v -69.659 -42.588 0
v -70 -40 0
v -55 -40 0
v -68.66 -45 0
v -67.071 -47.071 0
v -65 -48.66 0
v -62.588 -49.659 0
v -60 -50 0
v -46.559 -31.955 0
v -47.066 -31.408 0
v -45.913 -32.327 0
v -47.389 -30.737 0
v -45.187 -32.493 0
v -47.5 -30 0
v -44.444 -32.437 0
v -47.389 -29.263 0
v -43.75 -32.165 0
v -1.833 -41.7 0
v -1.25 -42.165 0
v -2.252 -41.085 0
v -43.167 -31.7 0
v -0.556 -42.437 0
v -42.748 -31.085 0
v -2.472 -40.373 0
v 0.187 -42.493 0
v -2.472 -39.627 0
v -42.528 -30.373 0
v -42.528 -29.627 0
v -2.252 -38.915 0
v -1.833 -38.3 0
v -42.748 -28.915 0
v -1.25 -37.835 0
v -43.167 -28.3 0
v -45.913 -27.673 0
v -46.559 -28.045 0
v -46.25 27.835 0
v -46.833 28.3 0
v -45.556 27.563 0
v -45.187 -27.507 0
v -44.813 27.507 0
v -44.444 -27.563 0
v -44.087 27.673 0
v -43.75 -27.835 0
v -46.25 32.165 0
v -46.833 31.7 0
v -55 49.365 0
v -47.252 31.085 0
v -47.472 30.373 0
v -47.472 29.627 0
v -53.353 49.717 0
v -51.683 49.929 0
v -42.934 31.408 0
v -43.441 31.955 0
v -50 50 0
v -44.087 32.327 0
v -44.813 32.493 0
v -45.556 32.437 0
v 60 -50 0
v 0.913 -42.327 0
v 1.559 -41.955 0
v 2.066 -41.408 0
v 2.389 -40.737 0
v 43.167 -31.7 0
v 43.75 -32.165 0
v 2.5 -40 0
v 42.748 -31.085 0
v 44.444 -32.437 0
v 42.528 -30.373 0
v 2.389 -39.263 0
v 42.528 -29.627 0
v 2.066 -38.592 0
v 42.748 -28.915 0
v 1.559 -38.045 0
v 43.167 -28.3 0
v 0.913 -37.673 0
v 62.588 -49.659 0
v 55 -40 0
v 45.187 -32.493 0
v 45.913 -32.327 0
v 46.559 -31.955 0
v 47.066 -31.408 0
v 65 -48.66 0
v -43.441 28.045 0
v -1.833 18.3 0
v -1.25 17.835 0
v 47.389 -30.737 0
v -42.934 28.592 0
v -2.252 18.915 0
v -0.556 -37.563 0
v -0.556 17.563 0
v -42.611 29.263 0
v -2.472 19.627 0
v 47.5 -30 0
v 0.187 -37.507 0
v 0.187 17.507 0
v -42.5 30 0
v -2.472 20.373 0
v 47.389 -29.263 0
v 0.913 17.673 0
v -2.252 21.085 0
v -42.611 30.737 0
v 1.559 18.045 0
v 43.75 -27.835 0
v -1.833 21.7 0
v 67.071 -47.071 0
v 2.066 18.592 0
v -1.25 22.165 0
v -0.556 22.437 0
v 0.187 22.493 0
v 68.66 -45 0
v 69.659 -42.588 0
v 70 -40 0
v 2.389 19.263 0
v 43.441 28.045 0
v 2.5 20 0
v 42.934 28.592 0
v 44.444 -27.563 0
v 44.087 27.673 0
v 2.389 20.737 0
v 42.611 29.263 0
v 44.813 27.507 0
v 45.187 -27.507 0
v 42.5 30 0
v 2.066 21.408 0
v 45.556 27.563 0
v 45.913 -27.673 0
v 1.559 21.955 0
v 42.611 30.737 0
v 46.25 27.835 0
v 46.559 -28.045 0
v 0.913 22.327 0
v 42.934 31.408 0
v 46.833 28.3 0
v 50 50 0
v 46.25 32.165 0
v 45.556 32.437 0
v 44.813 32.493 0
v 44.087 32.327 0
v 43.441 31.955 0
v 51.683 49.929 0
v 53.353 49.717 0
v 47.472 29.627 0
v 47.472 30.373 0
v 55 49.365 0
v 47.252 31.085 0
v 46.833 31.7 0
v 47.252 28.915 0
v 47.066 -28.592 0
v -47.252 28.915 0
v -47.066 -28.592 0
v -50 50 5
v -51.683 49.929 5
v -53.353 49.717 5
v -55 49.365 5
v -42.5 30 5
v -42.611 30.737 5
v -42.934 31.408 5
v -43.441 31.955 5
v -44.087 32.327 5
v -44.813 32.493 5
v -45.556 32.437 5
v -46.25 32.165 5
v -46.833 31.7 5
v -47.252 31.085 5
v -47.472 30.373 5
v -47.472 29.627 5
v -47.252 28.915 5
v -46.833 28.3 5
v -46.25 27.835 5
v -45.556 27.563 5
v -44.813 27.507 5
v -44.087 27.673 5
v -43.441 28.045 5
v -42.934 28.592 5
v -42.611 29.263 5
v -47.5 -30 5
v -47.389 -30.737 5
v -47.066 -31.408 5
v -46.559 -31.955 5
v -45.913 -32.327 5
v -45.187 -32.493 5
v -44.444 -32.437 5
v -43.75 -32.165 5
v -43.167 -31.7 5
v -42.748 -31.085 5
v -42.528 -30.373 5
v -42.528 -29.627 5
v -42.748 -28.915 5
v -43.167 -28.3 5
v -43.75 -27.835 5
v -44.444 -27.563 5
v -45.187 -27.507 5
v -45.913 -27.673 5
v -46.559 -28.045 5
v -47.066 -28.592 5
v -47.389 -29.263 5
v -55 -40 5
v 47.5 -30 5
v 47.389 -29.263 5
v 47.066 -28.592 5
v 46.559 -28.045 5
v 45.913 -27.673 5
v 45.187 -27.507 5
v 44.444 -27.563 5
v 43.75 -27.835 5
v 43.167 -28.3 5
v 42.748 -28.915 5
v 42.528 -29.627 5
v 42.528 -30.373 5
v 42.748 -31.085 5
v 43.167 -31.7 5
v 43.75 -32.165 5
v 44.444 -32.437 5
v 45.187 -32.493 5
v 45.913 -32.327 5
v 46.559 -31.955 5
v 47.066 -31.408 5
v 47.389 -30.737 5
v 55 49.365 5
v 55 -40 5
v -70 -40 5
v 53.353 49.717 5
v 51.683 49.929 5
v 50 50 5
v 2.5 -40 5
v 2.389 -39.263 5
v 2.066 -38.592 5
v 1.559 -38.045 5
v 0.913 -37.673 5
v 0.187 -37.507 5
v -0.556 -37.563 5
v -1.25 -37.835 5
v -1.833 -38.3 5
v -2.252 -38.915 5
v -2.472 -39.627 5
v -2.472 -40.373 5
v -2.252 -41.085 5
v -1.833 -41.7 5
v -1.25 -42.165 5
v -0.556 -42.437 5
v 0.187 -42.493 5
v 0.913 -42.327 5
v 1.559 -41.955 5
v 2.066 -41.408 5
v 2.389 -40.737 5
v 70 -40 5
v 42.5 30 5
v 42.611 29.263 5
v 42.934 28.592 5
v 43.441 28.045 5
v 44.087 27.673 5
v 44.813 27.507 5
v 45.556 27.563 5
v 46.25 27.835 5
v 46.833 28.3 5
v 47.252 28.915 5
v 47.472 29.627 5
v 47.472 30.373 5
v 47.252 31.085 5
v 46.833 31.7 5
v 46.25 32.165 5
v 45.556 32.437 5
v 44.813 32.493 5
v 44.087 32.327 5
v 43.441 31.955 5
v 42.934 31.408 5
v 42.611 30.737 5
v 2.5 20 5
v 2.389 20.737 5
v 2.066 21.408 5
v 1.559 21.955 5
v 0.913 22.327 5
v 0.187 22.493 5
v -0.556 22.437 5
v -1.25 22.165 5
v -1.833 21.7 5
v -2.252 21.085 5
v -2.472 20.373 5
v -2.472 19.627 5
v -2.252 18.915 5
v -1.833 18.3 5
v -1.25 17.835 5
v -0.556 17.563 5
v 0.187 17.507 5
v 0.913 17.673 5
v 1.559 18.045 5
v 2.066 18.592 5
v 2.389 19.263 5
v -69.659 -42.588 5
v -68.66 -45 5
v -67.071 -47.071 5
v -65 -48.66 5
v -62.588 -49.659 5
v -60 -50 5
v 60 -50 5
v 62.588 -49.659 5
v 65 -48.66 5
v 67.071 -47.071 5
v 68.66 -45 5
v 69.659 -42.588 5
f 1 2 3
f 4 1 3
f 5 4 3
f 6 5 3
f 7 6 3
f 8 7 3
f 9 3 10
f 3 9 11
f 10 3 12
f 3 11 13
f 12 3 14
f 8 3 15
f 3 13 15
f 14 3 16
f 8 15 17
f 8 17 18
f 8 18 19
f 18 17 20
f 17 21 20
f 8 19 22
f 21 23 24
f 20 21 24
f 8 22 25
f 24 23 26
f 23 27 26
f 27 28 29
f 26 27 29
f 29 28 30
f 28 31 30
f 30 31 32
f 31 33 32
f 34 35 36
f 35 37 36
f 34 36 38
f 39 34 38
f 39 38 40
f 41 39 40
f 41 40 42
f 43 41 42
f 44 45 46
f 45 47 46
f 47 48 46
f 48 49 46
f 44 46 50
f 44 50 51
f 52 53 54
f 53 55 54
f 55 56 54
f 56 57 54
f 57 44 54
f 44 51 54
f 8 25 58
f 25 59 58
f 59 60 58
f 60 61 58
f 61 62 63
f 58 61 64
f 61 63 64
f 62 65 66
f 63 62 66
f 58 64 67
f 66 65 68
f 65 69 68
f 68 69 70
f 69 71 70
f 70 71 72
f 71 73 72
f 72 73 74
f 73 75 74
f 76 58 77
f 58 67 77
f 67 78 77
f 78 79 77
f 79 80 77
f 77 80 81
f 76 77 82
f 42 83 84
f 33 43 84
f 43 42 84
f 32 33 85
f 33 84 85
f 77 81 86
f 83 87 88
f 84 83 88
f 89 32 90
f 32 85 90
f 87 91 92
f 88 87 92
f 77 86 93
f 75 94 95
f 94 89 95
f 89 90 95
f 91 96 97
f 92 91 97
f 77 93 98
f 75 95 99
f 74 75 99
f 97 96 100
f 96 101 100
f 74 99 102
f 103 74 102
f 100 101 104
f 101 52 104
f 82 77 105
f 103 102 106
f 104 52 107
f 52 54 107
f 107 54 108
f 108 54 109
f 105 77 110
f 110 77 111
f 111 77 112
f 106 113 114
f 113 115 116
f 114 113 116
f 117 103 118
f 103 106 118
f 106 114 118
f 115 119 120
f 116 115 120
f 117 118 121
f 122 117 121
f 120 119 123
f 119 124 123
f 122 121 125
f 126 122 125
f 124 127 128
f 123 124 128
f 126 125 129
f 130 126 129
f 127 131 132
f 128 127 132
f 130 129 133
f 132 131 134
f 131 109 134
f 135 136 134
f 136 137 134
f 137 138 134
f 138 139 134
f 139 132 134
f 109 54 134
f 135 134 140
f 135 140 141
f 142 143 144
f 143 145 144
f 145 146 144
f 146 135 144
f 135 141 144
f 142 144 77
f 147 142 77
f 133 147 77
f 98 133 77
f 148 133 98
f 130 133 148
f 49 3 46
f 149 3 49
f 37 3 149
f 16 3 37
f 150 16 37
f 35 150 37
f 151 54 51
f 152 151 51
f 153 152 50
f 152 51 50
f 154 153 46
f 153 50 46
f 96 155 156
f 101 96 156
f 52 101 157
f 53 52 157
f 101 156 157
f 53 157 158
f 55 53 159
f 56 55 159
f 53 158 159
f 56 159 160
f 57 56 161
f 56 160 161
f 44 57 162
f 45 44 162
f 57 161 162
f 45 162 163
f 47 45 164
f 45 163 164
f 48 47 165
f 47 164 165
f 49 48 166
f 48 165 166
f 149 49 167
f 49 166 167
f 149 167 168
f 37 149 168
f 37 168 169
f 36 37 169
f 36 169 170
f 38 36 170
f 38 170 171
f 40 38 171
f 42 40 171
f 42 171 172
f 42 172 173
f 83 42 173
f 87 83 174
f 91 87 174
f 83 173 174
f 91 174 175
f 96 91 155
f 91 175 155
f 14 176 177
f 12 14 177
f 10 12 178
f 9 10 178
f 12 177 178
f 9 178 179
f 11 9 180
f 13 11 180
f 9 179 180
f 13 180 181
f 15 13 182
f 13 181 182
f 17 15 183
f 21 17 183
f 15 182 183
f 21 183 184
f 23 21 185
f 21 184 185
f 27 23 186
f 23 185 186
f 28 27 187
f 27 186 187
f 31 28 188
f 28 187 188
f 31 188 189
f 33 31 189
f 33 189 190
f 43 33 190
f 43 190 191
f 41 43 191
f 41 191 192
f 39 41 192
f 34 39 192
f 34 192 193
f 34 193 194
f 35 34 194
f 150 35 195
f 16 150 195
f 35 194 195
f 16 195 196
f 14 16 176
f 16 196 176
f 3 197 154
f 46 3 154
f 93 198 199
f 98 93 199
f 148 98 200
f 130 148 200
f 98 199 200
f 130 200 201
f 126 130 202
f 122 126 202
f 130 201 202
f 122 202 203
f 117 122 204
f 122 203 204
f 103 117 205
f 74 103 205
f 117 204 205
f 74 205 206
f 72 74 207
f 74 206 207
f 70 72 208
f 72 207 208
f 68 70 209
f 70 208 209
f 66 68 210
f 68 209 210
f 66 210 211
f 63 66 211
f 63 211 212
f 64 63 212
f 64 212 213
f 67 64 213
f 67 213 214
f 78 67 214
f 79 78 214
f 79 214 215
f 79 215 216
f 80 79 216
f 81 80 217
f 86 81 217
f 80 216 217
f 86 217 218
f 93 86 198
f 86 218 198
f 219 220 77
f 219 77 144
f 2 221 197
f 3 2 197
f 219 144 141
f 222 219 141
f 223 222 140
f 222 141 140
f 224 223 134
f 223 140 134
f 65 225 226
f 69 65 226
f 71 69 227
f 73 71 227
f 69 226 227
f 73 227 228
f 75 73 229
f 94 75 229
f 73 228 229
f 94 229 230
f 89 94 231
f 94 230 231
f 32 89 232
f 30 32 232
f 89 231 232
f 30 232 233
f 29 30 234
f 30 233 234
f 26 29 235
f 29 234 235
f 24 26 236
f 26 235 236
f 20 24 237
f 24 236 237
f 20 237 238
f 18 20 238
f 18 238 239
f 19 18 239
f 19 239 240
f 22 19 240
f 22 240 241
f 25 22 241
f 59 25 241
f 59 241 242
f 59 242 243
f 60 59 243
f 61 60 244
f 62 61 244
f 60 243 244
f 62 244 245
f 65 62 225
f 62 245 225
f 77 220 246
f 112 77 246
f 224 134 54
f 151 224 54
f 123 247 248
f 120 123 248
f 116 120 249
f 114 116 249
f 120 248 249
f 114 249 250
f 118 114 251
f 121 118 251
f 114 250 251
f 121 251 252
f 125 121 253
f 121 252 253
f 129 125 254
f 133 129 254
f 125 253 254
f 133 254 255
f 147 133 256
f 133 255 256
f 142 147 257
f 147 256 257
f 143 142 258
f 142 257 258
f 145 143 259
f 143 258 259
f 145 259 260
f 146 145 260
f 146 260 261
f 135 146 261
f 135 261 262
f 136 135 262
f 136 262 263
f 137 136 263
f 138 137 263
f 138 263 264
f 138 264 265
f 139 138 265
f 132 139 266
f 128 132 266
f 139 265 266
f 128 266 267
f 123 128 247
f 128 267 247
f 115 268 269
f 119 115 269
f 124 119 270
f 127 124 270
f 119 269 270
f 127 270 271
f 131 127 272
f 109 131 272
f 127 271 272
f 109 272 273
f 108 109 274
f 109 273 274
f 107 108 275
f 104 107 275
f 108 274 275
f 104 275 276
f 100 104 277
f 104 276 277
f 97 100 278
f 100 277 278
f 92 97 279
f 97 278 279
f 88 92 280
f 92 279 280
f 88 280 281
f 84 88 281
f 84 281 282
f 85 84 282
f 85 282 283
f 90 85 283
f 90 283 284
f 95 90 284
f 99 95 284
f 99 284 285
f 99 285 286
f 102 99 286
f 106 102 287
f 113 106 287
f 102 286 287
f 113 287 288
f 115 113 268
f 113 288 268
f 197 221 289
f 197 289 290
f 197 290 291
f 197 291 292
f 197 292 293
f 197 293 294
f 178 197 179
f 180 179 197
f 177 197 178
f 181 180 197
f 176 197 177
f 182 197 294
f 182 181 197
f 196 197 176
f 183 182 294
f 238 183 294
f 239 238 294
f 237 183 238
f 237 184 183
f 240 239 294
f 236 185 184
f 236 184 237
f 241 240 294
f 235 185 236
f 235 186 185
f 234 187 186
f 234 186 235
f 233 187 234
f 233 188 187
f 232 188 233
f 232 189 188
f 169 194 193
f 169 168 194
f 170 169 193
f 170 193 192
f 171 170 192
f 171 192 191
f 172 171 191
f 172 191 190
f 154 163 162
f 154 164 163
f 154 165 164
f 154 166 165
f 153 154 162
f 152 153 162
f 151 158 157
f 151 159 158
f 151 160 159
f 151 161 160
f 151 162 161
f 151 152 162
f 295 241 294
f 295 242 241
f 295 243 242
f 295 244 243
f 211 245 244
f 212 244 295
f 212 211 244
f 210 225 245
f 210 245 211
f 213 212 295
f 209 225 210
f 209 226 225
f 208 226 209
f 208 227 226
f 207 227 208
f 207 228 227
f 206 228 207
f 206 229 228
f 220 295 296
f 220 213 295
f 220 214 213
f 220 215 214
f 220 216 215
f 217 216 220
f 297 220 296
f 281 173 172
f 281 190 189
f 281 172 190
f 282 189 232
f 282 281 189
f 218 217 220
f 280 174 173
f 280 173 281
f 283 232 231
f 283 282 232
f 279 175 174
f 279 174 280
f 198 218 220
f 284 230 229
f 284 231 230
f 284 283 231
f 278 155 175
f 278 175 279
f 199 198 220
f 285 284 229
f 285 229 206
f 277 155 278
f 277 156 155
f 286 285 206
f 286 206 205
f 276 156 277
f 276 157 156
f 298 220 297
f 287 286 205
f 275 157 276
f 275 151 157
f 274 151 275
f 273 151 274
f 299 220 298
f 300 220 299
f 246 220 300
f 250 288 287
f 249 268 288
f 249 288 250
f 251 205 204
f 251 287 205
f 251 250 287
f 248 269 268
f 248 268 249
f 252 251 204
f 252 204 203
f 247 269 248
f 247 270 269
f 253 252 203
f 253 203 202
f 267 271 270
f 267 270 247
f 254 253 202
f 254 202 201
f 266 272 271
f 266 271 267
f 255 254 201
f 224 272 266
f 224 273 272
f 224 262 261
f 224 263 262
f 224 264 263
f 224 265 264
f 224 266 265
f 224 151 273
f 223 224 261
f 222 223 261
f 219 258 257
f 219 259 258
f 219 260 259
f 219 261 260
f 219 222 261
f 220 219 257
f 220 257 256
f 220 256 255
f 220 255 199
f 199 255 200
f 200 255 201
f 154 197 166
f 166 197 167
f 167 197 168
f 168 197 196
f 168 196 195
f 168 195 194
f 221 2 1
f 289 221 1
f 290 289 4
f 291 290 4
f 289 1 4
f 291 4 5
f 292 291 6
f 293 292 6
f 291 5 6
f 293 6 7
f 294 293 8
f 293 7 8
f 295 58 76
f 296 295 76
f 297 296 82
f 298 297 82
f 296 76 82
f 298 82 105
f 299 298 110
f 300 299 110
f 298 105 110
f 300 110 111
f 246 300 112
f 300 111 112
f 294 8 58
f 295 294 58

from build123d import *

# Parameters (mm, degrees)
BOSS_EXTRUDE1_DEPTH = 5
SKETCH2_R           = 2.5
CUT_EXTRUDE1_DEPTH  = 5
SKETCH3_W           = 15
SKETCH3_H           = 89.364916731
CUT_EXTRUDE2_DEPTH  = 5
SKETCH4_R           = 2.5
CUT_EXTRUDE3_DEPTH  = 5


with BuildPart() as part:
    # Sketch1 → Boss-Extrude1 (new body)
    with BuildSketch(Plane.XY):
        with BuildLine():
            Line((-60, -50), (60, -50))
            ThreePointArc((60, -50), (67.071067812, -47.071067812), (70, -40))
            Line((70, -40), (70, 30))
            ThreePointArc((70, 30), (64.142135624, 44.142135624), (50, 50))
            Line((50, 50), (-50, 50))
            ThreePointArc((-50, 50), (-64.142135624, 44.142135624), (-70, 30))
            Line((-70, 30), (-70, -40))
            ThreePointArc((-70, -40), (-67.071067812, -47.071067812), (-60, -50))
        make_face()
    extrude(amount=BOSS_EXTRUDE1_DEPTH)

    # Sketch2 → Cut-Extrude1 (cut)
    with BuildSketch(Plane.XY.offset(5)):
        with Locations((0, -40)):
            Circle(SKETCH2_R)
        with Locations((-45, 30)):
            Circle(SKETCH2_R)
        with Locations(Location((45, 30, 0), (0, 0, 180))):
            Circle(SKETCH2_R)
        with Locations(Location((-45, -30, 0), (0, 0, 180))):
            Circle(SKETCH2_R)
        with Locations((45, -30)):
            Circle(SKETCH2_R)
    extrude(amount=-CUT_EXTRUDE1_DEPTH, mode=Mode.SUBTRACT)

    # Sketch3 → Cut-Extrude2 (cut)
    with BuildSketch(Plane.XY.offset(5)):
        with Locations((62.5, 4.682458366)):
            Rectangle(SKETCH3_W, SKETCH3_H)
        with Locations((-62.5, 4.682458366)):
            Rectangle(SKETCH3_W, SKETCH3_H)
    extrude(amount=-CUT_EXTRUDE2_DEPTH, mode=Mode.SUBTRACT)

    # Sketch4 → Cut-Extrude3 (cut)
    with BuildSketch(Plane.XY.offset(5)):
        with Locations((0, 20)):
            Circle(SKETCH4_R)
    extrude(amount=-CUT_EXTRUDE3_DEPTH, mode=Mode.SUBTRACT)


solid = part.part
